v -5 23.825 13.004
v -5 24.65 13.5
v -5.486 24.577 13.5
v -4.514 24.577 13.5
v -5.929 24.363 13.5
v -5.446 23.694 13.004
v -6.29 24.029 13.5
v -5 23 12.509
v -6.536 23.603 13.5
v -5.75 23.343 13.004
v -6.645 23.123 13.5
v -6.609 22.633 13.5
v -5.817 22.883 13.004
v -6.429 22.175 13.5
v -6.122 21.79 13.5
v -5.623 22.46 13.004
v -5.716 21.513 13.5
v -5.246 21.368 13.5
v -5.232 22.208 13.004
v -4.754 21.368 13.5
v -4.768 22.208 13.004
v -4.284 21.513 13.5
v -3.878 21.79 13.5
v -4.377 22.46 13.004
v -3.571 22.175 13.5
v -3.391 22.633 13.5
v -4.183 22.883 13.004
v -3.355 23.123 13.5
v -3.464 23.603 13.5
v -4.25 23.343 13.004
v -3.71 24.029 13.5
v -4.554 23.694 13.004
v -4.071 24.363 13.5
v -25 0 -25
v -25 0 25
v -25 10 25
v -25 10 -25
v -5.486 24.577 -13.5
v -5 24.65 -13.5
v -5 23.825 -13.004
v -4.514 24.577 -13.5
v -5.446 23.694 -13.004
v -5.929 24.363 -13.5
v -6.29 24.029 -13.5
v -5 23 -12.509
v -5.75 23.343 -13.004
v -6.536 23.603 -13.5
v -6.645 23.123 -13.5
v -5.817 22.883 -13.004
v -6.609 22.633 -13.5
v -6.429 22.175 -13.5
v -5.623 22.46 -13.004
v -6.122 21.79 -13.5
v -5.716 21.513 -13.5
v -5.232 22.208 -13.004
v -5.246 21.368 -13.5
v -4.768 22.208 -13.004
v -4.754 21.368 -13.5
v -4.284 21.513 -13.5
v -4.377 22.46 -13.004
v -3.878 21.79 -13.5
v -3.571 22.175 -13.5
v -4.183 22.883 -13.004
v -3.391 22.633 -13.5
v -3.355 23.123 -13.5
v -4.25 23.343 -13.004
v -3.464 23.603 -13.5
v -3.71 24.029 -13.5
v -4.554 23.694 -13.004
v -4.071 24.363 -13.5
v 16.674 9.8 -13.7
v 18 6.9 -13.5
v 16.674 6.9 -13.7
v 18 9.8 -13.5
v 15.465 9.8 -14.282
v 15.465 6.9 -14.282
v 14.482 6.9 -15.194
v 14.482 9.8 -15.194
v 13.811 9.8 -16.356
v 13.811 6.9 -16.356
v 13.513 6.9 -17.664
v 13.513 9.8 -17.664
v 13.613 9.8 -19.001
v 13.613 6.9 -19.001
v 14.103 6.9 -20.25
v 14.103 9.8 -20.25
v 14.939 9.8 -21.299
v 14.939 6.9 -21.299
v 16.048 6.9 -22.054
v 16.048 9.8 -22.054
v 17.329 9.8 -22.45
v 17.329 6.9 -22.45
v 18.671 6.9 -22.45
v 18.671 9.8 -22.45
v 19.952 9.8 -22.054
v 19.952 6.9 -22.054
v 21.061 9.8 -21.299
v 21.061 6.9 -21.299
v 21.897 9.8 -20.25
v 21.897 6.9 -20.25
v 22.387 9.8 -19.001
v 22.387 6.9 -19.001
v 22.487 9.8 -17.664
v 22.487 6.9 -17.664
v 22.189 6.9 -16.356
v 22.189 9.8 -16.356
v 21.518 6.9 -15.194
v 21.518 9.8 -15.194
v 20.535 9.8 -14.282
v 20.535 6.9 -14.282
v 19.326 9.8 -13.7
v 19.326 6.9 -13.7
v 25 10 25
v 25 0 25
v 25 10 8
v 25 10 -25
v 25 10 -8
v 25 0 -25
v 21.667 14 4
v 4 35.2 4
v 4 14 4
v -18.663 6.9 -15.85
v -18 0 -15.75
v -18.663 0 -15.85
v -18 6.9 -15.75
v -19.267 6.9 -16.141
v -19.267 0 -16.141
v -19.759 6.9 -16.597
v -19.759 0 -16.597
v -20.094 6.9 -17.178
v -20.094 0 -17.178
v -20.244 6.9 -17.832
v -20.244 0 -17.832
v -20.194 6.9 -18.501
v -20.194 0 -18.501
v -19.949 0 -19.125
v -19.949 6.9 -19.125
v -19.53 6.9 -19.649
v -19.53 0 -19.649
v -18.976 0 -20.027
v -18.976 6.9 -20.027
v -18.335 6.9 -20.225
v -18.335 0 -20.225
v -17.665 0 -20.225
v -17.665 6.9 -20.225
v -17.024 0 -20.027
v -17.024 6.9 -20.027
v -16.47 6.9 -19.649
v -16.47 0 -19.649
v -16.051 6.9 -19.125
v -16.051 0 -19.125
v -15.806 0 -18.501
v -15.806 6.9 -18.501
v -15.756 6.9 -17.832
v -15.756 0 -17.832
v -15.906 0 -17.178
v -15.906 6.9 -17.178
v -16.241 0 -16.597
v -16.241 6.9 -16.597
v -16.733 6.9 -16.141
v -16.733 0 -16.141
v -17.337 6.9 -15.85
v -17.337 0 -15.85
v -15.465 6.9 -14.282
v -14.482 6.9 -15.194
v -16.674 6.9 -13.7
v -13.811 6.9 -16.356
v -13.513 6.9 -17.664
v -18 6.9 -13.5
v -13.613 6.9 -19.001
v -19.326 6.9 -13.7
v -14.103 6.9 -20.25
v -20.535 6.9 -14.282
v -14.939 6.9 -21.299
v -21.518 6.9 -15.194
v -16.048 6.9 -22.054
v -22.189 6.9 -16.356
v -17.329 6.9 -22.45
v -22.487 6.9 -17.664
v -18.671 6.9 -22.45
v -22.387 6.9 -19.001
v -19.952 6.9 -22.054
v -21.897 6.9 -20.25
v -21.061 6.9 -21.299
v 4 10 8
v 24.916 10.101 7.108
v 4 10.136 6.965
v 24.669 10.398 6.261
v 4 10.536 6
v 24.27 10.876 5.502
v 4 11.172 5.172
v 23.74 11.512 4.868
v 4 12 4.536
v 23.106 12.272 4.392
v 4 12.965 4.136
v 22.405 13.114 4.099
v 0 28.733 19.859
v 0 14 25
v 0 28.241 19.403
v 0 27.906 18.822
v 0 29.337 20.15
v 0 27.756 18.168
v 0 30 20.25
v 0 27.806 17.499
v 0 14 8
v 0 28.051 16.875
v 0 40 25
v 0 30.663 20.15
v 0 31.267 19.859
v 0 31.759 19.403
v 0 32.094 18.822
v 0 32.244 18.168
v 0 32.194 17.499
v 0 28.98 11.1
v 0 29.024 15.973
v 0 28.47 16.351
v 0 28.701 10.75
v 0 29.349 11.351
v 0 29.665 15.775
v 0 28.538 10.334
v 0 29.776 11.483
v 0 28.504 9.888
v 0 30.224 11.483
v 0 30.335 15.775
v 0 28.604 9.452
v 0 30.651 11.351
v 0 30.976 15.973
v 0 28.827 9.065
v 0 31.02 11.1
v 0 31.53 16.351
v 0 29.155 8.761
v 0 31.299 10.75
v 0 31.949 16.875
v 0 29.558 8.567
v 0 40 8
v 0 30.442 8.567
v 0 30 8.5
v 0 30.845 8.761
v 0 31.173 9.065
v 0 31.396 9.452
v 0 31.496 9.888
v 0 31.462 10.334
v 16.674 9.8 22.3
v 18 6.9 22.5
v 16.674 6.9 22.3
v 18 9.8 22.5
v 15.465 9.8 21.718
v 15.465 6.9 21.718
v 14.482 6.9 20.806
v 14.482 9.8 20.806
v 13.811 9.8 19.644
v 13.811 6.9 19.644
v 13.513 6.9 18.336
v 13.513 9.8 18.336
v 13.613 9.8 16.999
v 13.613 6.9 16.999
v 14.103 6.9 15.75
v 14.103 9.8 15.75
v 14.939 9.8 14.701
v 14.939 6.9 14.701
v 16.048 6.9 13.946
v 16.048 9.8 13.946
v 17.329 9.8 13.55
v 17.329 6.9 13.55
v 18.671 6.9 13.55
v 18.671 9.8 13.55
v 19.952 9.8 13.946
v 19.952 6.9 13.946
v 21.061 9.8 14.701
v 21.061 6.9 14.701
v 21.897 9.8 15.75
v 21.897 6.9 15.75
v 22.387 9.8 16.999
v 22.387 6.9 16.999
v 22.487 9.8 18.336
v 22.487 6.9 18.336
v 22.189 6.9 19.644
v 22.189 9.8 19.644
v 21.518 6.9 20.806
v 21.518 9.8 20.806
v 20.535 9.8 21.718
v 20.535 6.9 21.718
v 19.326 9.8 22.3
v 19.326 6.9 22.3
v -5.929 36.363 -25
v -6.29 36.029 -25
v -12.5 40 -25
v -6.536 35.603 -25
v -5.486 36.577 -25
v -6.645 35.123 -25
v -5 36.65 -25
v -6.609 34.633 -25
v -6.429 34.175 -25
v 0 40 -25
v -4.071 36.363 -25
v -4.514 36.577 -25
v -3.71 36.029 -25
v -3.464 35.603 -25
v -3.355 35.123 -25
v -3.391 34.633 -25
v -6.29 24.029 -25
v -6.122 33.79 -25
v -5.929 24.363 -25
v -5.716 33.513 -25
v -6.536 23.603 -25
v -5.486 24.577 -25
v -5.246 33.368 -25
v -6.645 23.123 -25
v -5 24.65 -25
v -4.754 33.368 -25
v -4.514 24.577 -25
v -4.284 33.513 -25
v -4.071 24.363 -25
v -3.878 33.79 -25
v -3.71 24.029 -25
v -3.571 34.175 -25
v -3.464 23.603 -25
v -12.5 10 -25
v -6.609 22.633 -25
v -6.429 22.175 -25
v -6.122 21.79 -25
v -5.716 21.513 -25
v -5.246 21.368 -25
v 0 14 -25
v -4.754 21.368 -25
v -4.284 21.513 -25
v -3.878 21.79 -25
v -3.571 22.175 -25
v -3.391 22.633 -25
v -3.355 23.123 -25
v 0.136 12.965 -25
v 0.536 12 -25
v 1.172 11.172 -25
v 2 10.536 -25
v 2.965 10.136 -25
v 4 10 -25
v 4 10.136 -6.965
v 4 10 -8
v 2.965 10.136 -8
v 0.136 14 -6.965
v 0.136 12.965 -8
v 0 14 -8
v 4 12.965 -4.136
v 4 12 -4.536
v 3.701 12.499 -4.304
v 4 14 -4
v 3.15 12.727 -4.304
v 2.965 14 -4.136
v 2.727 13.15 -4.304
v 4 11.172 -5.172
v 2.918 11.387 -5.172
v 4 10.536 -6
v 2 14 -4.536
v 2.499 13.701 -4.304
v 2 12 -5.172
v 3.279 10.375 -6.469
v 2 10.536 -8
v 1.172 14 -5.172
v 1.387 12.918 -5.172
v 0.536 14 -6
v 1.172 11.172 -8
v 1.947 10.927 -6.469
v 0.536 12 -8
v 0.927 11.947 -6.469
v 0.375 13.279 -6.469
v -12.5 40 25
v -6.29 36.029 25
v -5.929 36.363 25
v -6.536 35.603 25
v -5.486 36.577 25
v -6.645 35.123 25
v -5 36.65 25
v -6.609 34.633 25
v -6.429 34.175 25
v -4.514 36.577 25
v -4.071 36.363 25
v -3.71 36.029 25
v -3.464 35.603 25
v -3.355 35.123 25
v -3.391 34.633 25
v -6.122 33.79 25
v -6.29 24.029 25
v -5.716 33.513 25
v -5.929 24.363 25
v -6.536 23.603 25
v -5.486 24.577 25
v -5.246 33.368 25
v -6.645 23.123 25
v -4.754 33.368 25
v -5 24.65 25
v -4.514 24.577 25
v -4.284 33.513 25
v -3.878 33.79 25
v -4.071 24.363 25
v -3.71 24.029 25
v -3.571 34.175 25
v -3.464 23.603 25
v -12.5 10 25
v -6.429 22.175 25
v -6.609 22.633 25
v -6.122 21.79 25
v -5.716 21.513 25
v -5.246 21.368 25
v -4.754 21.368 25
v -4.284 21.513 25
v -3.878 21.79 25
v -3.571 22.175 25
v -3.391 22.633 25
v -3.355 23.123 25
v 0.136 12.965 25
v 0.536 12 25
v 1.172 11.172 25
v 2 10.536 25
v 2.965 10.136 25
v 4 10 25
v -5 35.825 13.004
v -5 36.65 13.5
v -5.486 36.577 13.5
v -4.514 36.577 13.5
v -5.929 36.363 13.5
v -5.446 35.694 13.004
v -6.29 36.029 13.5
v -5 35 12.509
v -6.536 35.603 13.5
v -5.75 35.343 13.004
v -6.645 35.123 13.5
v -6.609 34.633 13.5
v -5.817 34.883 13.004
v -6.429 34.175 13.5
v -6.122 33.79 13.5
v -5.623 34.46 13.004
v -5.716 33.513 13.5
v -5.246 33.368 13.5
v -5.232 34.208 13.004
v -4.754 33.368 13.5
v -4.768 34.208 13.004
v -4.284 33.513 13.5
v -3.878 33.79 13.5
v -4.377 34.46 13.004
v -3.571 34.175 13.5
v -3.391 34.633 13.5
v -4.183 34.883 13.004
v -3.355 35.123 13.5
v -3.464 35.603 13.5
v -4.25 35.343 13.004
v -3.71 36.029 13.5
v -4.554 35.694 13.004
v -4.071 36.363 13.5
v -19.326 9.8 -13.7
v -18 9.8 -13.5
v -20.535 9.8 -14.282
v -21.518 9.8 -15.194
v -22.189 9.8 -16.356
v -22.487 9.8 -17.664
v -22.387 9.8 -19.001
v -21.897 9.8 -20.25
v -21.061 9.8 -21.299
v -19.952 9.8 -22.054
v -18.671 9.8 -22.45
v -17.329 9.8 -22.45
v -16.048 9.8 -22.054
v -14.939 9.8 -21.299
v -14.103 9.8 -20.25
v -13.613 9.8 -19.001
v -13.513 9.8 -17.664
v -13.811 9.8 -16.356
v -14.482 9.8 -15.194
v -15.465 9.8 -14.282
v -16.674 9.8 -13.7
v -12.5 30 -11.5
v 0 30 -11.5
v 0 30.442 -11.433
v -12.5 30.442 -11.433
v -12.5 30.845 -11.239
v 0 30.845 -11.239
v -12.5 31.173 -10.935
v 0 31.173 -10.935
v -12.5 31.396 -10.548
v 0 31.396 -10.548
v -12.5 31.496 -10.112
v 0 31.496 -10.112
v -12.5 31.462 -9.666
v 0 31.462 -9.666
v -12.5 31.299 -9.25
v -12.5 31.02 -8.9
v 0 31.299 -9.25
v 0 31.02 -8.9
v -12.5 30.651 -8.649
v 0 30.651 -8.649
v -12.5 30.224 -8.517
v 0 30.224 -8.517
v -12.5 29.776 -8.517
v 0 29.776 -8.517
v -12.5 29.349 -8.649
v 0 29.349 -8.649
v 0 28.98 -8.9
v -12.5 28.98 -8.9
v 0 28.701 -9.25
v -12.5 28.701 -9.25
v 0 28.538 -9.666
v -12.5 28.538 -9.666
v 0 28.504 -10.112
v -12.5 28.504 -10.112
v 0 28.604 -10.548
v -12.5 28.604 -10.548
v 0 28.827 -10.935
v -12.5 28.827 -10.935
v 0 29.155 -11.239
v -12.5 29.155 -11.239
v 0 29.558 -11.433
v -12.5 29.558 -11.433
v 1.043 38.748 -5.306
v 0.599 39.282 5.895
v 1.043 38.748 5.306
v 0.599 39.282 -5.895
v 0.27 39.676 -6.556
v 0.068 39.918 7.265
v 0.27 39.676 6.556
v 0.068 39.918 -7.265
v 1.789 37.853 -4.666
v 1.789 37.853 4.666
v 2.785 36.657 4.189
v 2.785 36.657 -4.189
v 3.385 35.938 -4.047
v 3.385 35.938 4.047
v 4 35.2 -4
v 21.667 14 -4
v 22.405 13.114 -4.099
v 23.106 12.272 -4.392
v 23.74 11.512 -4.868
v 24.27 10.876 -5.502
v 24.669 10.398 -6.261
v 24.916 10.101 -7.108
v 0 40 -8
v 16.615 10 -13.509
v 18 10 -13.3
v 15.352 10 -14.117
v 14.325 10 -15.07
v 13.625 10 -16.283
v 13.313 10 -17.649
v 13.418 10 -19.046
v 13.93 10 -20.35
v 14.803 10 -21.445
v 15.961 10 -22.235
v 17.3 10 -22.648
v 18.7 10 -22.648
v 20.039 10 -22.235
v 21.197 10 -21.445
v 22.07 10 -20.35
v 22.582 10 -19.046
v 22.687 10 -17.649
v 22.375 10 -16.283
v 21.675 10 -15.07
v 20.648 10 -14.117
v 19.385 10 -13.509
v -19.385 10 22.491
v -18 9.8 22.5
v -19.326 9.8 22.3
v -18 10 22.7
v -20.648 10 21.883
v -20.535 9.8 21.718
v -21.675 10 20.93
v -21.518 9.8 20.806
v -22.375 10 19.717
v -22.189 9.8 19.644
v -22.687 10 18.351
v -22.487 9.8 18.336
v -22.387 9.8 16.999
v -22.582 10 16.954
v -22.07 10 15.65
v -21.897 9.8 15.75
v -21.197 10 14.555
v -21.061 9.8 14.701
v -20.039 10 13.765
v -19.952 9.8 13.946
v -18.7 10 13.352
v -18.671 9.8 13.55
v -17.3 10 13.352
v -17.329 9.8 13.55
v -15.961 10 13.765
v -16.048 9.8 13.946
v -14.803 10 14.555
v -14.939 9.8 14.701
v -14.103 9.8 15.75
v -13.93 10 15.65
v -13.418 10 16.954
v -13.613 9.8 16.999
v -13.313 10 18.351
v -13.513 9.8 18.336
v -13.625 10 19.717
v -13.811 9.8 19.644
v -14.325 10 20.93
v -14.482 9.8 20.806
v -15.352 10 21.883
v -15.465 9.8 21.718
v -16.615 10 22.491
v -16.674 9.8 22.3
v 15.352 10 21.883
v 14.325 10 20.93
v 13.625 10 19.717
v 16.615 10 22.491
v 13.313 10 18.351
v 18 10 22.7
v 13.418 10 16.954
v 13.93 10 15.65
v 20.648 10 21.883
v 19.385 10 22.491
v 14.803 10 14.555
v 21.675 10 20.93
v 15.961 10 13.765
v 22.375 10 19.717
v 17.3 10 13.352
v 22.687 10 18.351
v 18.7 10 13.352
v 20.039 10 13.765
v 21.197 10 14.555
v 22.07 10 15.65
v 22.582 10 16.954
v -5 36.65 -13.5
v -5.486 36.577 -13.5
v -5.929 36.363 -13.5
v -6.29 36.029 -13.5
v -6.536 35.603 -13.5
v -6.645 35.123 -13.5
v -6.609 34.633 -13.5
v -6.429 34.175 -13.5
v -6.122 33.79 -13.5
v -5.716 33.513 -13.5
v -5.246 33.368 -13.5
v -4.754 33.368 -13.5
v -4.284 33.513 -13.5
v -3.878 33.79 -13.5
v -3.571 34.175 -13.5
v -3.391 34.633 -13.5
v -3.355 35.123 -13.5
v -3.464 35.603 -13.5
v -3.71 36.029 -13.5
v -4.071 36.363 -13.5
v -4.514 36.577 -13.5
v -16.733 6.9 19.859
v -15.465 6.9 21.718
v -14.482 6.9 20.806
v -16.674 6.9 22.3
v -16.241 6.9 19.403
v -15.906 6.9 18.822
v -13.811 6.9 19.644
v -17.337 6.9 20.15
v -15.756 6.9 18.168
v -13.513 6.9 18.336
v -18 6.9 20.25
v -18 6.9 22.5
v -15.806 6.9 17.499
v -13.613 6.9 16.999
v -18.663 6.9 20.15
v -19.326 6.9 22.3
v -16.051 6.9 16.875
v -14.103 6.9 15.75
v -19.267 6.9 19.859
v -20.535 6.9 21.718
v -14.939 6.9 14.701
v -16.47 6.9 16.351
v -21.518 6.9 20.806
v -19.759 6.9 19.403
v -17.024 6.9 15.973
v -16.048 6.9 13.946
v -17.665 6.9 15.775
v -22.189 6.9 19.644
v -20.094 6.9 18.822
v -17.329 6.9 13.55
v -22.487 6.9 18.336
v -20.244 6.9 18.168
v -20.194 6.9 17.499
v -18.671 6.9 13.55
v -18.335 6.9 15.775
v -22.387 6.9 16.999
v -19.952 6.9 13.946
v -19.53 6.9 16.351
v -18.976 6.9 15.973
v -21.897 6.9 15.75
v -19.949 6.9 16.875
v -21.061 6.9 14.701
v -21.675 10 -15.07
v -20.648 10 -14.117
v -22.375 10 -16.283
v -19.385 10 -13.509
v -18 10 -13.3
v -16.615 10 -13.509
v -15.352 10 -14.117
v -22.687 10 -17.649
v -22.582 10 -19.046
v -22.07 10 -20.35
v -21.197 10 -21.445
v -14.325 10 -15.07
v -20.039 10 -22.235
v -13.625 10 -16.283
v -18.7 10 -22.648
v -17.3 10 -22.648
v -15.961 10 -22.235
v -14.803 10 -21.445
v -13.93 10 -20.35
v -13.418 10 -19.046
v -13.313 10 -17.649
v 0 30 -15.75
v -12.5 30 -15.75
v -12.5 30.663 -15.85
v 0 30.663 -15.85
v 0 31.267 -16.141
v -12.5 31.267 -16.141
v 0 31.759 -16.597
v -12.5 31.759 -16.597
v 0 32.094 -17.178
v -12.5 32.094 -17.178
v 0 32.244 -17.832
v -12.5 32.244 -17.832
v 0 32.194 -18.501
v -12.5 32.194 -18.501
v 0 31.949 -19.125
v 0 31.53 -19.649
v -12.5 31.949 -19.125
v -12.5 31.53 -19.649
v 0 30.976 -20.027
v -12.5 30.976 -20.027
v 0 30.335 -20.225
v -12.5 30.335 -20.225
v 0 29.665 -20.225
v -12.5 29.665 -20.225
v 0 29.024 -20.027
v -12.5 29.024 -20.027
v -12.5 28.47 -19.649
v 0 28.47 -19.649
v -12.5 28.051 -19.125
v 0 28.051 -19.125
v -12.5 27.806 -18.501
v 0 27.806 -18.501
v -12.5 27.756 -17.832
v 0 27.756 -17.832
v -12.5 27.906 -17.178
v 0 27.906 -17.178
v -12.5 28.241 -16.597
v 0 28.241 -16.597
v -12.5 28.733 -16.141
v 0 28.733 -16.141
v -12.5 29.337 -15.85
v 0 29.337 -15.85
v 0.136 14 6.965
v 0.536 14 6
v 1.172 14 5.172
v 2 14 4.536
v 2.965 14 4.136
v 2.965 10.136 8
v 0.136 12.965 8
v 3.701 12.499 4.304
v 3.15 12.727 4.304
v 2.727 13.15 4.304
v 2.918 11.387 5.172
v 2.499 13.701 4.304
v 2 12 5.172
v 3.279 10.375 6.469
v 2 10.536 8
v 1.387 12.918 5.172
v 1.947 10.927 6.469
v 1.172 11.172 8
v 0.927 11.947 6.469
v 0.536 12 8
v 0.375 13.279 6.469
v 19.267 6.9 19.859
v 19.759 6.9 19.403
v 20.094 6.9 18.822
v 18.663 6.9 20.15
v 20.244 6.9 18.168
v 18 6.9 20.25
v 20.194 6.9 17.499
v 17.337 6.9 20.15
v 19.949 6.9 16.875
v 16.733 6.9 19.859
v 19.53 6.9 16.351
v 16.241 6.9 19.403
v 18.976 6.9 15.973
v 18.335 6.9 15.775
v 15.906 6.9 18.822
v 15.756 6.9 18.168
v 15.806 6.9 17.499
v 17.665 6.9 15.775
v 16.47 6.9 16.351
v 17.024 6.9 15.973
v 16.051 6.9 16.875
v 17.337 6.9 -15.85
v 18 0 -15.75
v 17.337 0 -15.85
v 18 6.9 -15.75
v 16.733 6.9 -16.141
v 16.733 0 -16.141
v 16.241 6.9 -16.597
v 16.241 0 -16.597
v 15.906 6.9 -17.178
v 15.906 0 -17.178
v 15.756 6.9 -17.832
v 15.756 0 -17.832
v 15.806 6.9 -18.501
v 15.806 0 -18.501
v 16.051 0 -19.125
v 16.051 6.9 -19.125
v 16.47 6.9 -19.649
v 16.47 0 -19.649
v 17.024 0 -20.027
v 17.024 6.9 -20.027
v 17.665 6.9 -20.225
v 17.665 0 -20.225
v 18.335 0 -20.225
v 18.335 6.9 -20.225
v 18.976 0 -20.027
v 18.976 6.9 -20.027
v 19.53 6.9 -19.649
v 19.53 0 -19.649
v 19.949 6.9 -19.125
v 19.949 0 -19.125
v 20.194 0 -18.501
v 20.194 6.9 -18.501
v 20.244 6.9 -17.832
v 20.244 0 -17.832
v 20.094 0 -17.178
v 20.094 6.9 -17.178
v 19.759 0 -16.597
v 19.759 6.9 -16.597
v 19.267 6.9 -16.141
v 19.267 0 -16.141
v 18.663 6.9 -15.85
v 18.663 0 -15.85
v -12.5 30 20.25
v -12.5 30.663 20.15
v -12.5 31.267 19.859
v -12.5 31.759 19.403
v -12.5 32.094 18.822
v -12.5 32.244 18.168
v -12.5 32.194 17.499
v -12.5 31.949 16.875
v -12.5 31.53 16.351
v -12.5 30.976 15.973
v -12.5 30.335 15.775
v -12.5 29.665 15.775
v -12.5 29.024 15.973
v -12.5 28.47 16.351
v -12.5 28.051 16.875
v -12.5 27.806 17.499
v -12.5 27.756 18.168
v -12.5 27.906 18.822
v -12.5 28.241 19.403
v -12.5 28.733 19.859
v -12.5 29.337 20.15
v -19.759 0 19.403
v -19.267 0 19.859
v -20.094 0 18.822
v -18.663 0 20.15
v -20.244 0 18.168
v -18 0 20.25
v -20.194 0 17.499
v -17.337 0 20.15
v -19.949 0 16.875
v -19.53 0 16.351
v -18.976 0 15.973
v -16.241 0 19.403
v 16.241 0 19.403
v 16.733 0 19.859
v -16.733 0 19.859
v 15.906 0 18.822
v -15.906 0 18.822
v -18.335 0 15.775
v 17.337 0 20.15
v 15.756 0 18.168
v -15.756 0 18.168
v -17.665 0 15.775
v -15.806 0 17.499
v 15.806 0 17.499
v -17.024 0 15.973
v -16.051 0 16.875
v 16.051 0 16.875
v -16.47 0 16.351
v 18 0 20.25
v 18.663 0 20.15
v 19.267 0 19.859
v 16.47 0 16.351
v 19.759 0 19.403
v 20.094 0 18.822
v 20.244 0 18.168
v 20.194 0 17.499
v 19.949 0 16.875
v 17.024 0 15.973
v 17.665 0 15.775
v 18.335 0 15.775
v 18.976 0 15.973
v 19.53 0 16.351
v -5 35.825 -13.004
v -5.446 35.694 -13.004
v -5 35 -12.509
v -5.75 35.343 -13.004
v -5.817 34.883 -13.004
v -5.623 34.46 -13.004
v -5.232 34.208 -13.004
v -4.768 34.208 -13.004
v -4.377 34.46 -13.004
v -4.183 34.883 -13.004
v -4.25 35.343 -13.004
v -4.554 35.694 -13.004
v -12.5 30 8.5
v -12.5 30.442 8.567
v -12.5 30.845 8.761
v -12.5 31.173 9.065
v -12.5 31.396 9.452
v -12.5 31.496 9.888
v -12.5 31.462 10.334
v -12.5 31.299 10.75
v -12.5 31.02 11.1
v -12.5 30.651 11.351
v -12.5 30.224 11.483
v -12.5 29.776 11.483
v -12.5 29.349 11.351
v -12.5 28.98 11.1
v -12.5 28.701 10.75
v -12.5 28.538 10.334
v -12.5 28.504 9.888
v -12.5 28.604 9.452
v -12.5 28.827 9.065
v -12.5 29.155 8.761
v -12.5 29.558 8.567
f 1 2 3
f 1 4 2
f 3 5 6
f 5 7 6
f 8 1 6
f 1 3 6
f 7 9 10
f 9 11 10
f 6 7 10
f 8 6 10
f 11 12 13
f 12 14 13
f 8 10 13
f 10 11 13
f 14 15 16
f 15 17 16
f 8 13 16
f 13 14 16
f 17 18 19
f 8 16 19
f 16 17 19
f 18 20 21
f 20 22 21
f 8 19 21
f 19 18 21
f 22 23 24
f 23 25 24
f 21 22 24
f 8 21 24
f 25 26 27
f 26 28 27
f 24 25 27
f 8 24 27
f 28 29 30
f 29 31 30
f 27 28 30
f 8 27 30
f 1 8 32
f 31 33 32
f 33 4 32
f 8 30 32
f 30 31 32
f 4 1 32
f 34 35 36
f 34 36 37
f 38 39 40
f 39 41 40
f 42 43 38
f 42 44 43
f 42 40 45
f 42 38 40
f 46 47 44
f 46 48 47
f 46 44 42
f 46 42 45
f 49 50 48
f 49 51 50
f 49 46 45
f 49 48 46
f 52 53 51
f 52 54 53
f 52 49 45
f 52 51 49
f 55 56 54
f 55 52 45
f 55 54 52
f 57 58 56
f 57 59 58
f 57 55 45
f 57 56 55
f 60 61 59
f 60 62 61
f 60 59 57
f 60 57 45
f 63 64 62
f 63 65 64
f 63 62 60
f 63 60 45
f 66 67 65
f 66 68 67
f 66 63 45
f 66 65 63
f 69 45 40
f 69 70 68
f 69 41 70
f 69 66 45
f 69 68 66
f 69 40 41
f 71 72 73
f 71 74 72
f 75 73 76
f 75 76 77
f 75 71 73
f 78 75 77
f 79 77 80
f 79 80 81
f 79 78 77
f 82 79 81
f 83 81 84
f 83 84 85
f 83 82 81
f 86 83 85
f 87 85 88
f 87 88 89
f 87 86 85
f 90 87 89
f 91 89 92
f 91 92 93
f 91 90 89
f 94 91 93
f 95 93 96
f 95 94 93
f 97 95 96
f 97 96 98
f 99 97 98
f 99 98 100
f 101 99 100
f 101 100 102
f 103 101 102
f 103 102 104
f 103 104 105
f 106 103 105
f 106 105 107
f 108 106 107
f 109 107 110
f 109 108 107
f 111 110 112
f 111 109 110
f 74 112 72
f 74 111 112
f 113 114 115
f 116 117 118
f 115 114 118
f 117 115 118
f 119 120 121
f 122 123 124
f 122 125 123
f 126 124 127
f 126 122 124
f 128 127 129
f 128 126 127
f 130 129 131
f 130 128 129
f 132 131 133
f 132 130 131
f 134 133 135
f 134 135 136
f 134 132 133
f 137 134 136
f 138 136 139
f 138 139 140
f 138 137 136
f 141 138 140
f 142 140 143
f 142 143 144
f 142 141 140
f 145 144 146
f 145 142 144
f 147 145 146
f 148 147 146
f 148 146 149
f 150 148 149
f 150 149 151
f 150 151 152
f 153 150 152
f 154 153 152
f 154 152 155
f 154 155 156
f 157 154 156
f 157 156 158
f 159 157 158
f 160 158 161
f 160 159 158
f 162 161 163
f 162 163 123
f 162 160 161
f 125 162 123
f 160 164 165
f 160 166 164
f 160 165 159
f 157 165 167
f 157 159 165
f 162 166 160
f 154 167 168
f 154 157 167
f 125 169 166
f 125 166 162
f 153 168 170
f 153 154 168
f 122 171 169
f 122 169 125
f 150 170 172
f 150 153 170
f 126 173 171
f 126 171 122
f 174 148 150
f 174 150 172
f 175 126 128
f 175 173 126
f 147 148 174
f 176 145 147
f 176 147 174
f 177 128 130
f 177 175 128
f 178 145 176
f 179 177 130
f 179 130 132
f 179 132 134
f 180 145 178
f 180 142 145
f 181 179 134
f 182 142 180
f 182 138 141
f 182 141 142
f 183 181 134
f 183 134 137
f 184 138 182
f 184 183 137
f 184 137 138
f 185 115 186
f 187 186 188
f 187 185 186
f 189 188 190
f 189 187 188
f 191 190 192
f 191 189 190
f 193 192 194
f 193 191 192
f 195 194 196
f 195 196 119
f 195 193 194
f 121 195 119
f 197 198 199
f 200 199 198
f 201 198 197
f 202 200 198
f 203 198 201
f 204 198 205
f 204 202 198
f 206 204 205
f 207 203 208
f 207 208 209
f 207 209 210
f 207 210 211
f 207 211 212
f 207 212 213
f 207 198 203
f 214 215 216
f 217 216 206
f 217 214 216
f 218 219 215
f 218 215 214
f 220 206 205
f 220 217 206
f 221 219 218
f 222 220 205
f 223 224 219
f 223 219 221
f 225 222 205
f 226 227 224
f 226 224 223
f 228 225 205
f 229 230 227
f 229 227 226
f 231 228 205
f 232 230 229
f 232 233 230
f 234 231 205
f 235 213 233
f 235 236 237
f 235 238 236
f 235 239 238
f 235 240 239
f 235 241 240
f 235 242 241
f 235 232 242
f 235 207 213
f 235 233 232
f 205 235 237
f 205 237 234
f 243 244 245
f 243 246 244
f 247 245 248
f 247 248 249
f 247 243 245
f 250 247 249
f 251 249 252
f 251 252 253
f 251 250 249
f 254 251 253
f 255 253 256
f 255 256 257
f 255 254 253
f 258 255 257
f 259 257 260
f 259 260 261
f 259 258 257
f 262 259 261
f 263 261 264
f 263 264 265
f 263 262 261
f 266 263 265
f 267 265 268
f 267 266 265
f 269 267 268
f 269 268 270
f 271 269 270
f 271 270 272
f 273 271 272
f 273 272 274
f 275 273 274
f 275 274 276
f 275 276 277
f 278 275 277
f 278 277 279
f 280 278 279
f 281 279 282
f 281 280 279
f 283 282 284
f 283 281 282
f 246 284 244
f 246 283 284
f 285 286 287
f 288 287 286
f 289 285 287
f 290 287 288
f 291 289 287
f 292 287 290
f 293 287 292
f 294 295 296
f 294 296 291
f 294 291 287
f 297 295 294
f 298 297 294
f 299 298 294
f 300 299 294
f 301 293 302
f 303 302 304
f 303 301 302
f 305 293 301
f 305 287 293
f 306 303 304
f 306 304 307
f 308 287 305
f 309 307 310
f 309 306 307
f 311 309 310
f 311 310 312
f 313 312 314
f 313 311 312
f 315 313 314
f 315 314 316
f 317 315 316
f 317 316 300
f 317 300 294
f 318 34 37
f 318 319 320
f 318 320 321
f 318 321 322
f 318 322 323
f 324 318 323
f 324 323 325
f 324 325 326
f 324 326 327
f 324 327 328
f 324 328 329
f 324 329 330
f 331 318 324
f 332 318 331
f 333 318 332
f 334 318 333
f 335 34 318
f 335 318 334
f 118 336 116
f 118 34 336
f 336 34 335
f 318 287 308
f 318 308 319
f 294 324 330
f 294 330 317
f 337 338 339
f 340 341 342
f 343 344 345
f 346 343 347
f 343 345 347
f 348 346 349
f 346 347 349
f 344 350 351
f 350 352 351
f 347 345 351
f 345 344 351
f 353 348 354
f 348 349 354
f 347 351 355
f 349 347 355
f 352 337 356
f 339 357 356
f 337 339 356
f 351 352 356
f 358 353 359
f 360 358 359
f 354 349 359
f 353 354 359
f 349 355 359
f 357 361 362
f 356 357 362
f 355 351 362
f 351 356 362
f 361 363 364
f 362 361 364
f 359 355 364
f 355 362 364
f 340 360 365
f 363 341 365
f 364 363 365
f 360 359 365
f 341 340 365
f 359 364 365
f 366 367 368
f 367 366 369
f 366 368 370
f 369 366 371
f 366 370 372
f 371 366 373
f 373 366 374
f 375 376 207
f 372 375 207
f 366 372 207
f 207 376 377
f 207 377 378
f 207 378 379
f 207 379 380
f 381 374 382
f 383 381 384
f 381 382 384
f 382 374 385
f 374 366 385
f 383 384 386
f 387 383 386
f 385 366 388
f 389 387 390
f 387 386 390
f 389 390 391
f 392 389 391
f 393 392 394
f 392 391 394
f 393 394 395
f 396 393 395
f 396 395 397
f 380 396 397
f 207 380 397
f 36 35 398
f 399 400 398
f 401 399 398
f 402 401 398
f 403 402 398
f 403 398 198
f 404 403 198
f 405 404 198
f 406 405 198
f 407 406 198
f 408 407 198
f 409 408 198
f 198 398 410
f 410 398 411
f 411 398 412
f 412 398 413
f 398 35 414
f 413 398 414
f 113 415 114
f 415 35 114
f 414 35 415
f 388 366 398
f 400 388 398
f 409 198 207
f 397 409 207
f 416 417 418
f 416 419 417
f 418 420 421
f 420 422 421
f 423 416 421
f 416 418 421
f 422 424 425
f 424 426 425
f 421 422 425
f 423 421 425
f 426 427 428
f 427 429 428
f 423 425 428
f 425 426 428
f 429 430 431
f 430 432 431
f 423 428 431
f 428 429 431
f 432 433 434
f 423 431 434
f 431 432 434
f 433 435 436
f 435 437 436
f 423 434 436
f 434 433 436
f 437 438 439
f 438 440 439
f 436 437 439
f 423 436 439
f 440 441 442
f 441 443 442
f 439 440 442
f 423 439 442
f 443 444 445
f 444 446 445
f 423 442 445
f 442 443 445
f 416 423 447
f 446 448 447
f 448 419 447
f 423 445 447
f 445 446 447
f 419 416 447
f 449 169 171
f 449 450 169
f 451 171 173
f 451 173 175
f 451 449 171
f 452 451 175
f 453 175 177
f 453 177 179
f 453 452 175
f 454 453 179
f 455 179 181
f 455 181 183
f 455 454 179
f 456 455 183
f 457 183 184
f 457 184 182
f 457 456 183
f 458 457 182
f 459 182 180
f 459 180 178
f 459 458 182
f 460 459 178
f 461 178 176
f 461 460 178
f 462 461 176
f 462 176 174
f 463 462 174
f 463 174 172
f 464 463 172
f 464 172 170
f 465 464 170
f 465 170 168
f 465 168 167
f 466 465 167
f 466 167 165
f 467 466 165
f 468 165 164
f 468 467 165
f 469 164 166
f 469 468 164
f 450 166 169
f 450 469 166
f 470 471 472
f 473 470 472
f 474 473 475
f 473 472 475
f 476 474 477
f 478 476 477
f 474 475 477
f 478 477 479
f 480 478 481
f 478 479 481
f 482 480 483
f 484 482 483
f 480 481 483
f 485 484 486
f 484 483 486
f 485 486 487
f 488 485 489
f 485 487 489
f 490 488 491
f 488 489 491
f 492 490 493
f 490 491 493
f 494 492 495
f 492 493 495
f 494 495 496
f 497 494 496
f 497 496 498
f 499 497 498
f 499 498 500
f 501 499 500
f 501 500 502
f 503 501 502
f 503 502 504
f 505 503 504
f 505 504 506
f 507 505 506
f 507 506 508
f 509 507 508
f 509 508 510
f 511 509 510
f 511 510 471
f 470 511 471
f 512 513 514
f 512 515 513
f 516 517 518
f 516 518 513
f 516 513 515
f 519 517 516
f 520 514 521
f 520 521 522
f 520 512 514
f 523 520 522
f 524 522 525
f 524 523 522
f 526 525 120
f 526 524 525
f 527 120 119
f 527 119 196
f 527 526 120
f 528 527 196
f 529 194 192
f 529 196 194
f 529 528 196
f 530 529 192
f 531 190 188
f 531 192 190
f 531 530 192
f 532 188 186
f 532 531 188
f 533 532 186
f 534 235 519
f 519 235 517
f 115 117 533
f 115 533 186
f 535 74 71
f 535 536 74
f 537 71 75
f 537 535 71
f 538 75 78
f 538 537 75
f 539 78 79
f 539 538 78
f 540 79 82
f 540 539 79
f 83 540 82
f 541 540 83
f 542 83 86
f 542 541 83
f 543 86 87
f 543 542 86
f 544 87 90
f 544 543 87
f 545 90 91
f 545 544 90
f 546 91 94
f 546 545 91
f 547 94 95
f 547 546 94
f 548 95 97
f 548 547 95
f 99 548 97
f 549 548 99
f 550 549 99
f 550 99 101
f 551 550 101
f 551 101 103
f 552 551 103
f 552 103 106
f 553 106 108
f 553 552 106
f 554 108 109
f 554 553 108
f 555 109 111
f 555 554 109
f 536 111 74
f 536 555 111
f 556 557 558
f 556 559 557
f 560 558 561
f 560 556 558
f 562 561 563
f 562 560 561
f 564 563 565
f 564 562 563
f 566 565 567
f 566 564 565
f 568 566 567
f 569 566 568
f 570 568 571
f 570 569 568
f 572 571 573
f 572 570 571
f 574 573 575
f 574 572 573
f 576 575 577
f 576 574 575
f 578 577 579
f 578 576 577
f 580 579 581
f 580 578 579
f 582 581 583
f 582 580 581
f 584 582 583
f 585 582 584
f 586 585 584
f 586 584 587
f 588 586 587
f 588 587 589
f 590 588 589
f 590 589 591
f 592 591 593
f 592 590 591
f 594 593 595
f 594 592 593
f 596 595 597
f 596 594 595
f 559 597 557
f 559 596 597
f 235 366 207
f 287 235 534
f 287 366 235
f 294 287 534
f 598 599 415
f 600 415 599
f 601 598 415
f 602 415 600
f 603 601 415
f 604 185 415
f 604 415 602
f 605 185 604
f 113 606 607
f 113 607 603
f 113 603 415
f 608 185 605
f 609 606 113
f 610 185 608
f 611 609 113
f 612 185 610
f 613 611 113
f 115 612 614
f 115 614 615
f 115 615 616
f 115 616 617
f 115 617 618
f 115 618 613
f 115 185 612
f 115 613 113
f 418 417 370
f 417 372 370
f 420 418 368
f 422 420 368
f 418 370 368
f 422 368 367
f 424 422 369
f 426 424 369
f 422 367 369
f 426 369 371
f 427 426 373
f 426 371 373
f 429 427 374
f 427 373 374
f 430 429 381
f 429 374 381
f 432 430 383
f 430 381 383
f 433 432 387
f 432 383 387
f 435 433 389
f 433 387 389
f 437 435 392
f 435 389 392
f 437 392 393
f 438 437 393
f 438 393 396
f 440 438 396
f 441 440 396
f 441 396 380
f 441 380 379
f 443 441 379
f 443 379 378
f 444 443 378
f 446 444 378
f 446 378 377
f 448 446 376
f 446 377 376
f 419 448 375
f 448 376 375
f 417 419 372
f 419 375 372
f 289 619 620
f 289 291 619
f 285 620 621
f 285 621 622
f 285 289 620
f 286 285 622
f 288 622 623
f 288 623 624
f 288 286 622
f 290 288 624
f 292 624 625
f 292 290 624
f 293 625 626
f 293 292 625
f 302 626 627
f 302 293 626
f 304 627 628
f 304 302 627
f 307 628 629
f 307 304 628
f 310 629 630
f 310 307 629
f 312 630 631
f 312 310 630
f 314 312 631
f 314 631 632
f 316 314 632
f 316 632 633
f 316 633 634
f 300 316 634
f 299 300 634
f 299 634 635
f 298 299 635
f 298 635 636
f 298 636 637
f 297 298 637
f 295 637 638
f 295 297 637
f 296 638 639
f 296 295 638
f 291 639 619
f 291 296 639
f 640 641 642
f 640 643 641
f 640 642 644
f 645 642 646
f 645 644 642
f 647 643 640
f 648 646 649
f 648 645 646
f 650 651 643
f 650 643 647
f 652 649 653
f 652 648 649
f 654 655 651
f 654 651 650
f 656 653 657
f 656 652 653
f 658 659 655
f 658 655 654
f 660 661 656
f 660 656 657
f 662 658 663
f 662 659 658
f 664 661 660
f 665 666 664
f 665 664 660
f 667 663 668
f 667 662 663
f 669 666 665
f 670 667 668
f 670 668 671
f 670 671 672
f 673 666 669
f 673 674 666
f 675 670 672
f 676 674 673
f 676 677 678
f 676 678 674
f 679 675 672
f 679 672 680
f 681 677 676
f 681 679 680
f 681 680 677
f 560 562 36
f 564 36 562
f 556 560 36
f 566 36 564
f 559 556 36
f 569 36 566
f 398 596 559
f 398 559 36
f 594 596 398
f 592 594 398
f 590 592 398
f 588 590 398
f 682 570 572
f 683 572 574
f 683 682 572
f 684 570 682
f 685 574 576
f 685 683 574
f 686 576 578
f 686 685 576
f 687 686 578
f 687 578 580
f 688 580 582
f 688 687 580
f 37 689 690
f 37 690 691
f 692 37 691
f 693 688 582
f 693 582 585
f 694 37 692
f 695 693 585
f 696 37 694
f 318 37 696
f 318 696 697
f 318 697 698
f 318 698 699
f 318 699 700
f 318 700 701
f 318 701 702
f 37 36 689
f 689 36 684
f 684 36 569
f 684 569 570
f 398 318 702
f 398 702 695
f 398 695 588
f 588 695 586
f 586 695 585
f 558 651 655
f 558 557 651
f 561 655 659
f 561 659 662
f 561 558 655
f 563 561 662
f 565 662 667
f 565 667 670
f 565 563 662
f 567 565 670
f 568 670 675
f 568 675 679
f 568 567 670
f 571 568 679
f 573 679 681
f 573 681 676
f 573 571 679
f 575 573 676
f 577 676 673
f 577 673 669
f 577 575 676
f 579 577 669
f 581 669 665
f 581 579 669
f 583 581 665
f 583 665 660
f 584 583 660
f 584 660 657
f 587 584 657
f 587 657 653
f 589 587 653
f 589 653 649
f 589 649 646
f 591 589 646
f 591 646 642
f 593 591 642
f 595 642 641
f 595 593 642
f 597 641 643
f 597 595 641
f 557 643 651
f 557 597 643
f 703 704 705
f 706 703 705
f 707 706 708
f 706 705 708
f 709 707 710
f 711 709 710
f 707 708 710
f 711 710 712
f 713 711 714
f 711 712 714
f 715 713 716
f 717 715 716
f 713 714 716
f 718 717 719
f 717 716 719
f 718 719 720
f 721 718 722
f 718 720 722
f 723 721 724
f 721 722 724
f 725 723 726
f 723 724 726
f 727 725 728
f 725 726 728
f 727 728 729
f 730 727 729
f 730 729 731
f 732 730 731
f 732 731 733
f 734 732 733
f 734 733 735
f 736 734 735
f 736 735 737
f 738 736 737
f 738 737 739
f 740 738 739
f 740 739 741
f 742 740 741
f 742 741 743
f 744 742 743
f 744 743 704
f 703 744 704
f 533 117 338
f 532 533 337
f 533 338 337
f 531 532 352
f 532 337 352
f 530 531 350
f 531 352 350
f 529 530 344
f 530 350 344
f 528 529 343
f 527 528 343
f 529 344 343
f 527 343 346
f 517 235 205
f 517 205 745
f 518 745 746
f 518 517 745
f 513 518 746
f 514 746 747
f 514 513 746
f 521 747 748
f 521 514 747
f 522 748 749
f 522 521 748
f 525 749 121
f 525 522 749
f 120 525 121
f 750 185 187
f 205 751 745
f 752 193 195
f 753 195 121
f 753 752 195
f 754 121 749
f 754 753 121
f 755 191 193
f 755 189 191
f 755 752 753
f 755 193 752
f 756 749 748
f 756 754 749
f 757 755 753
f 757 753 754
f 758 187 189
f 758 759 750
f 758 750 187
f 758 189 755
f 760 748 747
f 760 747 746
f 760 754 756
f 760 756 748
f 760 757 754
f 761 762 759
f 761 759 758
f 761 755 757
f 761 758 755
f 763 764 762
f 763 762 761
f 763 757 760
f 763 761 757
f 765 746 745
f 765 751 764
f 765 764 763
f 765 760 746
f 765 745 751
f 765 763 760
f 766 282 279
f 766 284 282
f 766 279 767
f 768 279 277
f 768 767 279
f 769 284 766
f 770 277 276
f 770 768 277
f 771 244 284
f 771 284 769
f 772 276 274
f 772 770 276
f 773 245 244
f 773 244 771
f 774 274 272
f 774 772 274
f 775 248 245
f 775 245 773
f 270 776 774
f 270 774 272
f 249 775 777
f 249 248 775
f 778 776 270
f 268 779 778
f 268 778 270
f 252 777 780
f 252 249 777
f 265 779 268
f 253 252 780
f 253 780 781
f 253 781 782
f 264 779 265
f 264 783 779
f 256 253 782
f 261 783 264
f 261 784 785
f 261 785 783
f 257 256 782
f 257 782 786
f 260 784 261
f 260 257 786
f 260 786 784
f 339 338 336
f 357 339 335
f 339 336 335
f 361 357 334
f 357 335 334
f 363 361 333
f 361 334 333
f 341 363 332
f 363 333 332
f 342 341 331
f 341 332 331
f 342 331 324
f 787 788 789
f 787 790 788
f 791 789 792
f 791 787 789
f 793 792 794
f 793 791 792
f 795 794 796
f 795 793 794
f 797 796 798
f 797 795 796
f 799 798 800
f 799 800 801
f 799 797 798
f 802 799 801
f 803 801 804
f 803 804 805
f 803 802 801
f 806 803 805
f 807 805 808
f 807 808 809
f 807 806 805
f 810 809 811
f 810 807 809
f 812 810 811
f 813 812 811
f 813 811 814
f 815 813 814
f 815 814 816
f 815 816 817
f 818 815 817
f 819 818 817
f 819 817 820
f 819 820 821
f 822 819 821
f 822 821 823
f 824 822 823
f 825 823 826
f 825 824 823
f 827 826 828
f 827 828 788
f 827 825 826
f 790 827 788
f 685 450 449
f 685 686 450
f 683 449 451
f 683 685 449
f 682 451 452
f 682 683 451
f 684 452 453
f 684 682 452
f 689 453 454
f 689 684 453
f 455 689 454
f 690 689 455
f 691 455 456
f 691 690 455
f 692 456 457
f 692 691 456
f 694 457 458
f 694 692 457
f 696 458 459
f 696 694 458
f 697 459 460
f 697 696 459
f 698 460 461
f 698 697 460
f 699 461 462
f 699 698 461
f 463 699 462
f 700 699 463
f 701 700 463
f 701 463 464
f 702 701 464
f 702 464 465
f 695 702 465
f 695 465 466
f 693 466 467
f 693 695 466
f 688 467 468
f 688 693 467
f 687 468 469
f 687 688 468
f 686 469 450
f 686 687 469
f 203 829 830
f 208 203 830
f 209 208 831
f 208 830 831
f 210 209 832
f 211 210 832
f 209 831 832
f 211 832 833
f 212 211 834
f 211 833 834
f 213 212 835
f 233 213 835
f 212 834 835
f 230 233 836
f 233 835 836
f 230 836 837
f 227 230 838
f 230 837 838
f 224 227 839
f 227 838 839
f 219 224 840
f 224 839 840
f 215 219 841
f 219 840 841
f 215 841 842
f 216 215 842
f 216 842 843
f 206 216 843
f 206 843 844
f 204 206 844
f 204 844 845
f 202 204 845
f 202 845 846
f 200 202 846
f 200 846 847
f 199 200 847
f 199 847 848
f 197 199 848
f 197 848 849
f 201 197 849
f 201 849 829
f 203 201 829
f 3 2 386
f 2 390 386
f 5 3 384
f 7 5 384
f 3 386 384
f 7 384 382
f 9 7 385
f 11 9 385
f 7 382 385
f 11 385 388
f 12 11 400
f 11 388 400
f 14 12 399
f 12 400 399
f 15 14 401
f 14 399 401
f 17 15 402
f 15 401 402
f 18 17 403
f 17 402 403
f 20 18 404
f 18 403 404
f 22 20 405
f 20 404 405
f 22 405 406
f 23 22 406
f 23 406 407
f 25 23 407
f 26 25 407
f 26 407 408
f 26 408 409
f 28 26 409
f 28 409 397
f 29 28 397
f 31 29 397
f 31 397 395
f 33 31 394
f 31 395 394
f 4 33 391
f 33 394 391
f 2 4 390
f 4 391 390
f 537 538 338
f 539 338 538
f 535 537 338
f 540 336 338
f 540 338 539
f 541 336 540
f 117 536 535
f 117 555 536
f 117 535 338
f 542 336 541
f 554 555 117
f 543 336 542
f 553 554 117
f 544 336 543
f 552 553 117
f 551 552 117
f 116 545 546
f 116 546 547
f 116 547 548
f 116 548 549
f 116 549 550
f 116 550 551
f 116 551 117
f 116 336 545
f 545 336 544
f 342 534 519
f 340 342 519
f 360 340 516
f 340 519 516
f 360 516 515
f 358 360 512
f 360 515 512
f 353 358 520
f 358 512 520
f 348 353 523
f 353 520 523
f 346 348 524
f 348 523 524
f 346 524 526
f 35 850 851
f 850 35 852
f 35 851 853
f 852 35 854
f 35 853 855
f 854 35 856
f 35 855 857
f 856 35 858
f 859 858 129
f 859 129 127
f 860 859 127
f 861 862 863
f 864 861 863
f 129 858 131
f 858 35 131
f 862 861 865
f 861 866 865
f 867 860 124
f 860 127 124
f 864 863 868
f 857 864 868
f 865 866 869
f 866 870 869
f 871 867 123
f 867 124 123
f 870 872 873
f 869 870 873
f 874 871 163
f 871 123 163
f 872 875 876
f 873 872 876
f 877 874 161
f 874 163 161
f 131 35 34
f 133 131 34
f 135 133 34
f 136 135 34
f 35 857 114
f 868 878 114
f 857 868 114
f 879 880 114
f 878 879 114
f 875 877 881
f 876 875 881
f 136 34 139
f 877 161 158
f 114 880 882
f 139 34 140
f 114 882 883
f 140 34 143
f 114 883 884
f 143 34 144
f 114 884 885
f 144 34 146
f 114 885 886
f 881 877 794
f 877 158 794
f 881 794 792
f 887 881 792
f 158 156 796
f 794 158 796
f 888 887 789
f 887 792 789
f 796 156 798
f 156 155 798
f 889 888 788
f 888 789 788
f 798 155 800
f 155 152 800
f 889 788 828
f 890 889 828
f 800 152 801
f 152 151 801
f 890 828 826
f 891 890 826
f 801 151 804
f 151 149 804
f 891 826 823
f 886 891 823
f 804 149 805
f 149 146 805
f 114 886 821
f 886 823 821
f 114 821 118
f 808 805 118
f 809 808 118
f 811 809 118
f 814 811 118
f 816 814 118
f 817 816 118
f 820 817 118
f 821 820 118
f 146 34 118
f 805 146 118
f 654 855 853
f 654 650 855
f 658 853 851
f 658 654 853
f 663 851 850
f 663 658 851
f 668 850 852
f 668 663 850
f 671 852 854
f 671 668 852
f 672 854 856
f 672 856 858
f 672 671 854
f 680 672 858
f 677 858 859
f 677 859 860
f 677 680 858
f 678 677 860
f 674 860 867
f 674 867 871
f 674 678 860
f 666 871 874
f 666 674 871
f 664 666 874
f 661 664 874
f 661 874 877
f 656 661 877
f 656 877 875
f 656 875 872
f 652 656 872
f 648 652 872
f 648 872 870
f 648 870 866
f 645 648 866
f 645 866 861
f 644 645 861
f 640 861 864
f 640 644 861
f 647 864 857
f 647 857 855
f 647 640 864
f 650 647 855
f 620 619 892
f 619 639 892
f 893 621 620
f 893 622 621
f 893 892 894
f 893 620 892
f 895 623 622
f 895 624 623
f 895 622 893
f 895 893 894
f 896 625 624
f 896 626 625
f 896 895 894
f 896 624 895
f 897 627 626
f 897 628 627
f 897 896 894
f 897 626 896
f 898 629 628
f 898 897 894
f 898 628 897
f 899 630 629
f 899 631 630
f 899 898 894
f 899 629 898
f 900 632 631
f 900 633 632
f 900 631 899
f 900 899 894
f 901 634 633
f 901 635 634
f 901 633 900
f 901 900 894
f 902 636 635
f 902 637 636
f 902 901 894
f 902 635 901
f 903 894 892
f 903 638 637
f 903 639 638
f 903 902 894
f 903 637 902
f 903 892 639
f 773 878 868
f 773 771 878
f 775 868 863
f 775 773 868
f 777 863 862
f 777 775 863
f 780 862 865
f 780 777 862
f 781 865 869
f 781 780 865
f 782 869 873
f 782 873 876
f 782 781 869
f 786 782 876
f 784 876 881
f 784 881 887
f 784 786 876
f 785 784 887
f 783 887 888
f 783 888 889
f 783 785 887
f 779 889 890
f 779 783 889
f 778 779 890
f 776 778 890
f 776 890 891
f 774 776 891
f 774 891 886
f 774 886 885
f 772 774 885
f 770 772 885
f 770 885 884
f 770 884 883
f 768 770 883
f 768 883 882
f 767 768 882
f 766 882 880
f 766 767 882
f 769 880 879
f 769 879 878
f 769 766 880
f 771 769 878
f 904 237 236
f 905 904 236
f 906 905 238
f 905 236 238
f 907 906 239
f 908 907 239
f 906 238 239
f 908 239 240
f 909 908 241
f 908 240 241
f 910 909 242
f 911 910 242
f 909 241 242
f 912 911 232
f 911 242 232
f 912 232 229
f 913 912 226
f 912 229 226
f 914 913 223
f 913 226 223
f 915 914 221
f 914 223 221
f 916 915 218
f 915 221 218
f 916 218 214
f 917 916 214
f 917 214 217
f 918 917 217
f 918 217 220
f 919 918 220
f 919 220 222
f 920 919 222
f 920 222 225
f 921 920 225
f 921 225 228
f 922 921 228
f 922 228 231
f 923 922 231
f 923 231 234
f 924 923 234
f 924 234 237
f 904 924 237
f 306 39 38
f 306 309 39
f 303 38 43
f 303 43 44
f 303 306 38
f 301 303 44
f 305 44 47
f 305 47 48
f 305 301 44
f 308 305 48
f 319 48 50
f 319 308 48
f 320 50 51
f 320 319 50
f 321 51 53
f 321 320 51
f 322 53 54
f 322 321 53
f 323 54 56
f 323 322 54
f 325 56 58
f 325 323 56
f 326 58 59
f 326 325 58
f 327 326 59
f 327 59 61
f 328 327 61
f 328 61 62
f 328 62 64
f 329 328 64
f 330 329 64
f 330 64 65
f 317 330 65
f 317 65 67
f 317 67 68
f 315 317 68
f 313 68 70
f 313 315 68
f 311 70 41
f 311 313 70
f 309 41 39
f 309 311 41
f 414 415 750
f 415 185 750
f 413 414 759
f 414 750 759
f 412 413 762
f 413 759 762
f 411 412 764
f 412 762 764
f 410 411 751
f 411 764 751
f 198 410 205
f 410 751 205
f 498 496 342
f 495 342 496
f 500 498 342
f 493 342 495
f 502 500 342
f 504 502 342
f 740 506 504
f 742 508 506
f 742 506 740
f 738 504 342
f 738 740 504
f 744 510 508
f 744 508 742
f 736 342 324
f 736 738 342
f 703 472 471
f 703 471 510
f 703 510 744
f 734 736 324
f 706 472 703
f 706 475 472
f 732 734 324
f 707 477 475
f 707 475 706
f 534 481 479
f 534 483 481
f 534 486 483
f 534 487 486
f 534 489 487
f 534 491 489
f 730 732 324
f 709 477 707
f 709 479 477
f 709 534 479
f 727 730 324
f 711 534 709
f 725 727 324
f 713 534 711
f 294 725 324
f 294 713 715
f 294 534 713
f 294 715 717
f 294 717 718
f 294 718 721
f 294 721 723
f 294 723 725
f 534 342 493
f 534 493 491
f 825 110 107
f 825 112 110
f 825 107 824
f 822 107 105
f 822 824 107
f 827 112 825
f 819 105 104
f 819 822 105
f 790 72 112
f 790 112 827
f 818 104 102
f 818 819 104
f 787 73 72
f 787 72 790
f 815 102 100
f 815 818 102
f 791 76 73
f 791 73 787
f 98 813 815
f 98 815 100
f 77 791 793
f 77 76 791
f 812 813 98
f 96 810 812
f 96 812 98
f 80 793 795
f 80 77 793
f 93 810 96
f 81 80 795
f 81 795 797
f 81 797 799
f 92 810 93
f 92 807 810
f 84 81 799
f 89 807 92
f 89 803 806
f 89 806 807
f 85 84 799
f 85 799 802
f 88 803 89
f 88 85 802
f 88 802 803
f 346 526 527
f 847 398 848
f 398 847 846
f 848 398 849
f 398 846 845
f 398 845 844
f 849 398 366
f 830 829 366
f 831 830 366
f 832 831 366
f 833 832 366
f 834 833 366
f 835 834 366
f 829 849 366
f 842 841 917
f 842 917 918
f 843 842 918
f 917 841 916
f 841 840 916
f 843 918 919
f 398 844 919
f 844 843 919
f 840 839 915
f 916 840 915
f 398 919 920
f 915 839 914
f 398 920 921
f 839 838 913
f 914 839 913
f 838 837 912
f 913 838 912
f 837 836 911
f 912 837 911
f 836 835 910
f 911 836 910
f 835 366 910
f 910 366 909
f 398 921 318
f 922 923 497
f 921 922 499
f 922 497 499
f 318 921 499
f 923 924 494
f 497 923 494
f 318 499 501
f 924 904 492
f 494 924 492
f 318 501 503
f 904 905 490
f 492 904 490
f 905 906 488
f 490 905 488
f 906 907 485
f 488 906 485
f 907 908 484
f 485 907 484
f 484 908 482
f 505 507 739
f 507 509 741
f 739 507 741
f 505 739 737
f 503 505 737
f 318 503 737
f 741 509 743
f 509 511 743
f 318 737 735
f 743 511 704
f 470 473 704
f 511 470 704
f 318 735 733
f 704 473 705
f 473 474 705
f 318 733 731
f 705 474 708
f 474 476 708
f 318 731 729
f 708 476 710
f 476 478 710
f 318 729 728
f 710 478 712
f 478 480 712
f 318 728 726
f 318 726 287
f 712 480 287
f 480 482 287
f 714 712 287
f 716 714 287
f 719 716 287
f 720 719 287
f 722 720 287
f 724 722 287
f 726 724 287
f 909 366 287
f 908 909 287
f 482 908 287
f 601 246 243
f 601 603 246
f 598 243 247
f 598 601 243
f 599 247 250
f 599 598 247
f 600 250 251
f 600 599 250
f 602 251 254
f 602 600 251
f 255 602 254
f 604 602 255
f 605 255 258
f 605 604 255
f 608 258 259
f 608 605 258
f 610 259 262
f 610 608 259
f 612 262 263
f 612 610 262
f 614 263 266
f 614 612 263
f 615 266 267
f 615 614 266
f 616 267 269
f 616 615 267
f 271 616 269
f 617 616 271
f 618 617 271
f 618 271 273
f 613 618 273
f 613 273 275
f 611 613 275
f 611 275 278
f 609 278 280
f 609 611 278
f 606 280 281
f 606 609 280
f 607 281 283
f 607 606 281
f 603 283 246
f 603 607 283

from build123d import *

# Parameters (mm, degrees)
SKIZZE1_W                                    = 50
SKIZZE1_H                                    = 50
AUFSATZ_LINEAR_AUSTRAGEN1_DEPTH              = 40
SKIZZE2_W                                    = 12.5
SKIZZE2_H                                    = 50
SKIZZE2_W_2                                  = 25
SCHNITT_LINEAR_AUSTRAGEN1_DEPTH              = 30
STIRNSENKUNG_F_R_M4_FLACHKOPFSCHRAUB_2_COUNT = 2
STIRNSENKUNG_F_R_M4_FLACHKOPFSCHRAUB_2_PITCH = 36
STIRNSENKUNG_F_R_M4_FLACHKOPFSCHRAUB_3_COUNT = 2
STIRNSENKUNG_F_R_M4_FLACHKOPFSCHRAUB_3_PITCH = 36
STIRNSENKUNG_F_R_M4_FLACHKOPFSCHRAUB_4_COUNT = 2
STIRNSENKUNG_F_R_M4_FLACHKOPFSCHRAUB_4_PITCH = 50.911688245
VERST_RKUNGSRIPPE4_REACH                     = 55.385
SKIZZE7_WALL_W                               = 147.8220309
SKIZZE7_WALL_H                               = 8
VERRUNDUNG1_R                                = 4
DURCHGANGSLOCH_F_R_M41_D                     = 4.5
F_3_0_3_DURCHMESSER_BOHRUNG1_D               = 3
M4_GEWINDEBOHRUNG1_AT_2_COUNT                = 2
M4_GEWINDEBOHRUNG1_AT_2_PITCH                = 12


with BuildPart() as part:
    # Skizze1 → Aufsatz-Linear austragen1 (new body)
    with BuildSketch(Plane(origin=(0, 0, 0), x_dir=(1, 0, 0), z_dir=(0, 1, 0))):
        Rectangle(SKIZZE1_W, SKIZZE1_H)
    extrude(amount=AUFSATZ_LINEAR_AUSTRAGEN1_DEPTH)

    # Skizze2 → Schnitt-Linear austragen1 (cut)
    with BuildSketch(Plane(origin=(0, 40, 0), x_dir=(1, 0, 0), z_dir=(0, 1, 0))):
        with Locations((-18.75, 0)):
            Rectangle(SKIZZE2_W, SKIZZE2_H)
        with Locations((12.5, 0)):
            Rectangle(SKIZZE2_W_2, SKIZZE2_H)
    extrude(amount=-SCHNITT_LINEAR_AUSTRAGEN1_DEPTH, mode=Mode.SUBTRACT)

    # Skizze4 → Stirnsenkung für M4 Flachkopfschraube mit Schlitz1 (revolve, cut)
    with BuildSketch(Plane(origin=(-18, 10, 18), x_dir=(0, 0, 1), z_dir=(1, 0, 0))):
        Polygon((0, 0), (0, 10), (2.25, 10), (2.25, 3.1), (4.5, 3.1), (4.5, 0.2), (4.7, 0), align=None)
    stirnsenkung_f_r_m4_flachkopfschraube_mi = revolve(axis=Axis((-18, 16.35, 18), (0, -1, 0)), mode=Mode.SUBTRACT)

    # Stirnsenkung f_r M4 Flachkopfschraub 2: Stirnsenkung für M4 Flachkopfschraube mit Schlitz1 ×2
    with Locations(*[(0, 0, -i * STIRNSENKUNG_F_R_M4_FLACHKOPFSCHRAUB_2_PITCH) for i in range(1, STIRNSENKUNG_F_R_M4_FLACHKOPFSCHRAUB_2_COUNT)]):
        add(stirnsenkung_f_r_m4_flachkopfschraube_mi, mode=Mode.SUBTRACT)

    # Stirnsenkung f_r M4 Flachkopfschraub 3: Stirnsenkung für M4 Flachkopfschraube mit Schlitz1 ×2
    with Locations(*[(i * STIRNSENKUNG_F_R_M4_FLACHKOPFSCHRAUB_3_PITCH, 0, 0) for i in range(1, STIRNSENKUNG_F_R_M4_FLACHKOPFSCHRAUB_3_COUNT)]):
        add(stirnsenkung_f_r_m4_flachkopfschraube_mi, mode=Mode.SUBTRACT)

    # Stirnsenkung f_r M4 Flachkopfschraub 4: Stirnsenkung für M4 Flachkopfschraube mit Schlitz1 ×2
    with Locations(*[Vector(0.7071067811865476, 0, -0.7071067811865476) * (i * STIRNSENKUNG_F_R_M4_FLACHKOPFSCHRAUB_4_PITCH) for i in range(1, STIRNSENKUNG_F_R_M4_FLACHKOPFSCHRAUB_4_COUNT)]):
        add(stirnsenkung_f_r_m4_flachkopfschraube_mi, mode=Mode.SUBTRACT)

    # Skizze7 wall → Verstärkungsrippe4 (add, up to next)
    with BuildSketch(Plane(origin=(12.5, 25, 0), x_dir=(0.640184399664, -0.768221279597, 0), z_dir=(0.768221279597, 0.640184399664, 0)), mode=Mode.PRIVATE) as verst_rkungsrippe4_sk1:
        Rectangle(SKIZZE7_WALL_W, SKIZZE7_WALL_H)
    verst_rkungsrippe4_tool1 = extrude(verst_rkungsrippe4_sk1.sketch, amount=-VERST_RKUNGSRIPPE4_REACH, mode=Mode.PRIVATE) - part.part
    add(verst_rkungsrippe4_tool1.solids().sort_by_distance((12.5, 25, 0))[0])

    # Verrundung1
    verrundung1_edges = [part.edges().sort_by_distance(p)[0] for p in [
        (0, 10, -14.5),
        (0, 10, 14.5),
        (12.5, 10, -4),
        (12.5, 10, 4),
        (0, 25, 4),
        (0, 25, -4),
    ]]
    fillet(verrundung1_edges, radius=VERRUNDUNG1_R)

    # Durchgangsloch für M41 (through all)
    with Locations(Plane(origin=(0, 0, 0), x_dir=(0, 0, -1), z_dir=(1, 0, 0))):
        with Locations((-18, 30), (18, 30)):
            Hole(DURCHGANGSLOCH_F_R_M41_D / 2)

    # Ø3.0 (3) Durchmesser Bohrung1 (through all)
    with Locations(Plane.ZY.offset(12.5)):
        with Locations((-10, 30), (10, 30)):
            Hole(F_3_0_3_DURCHMESSER_BOHRUNG1_D / 2)

    # Skizze14 → M4 Gewindebohrung1 (revolve, cut)
    with BuildSketch(Plane(origin=(-5, 35, -25), x_dir=(0, 1, 0), z_dir=(1, 0, 0))):
        Polygon((0, 0), (0, 12.491420021), (1.65, 11.5), (1.65, 0), align=None)
    m4_gewindebohrung1 = revolve(axis=Axis((-5, 35, -31.35), (0, 0, 1)), mode=Mode.SUBTRACT)

    # M4 Gewindebohrung1 at 2: M4 Gewindebohrung1 ×2
    with Locations(*[(0, -i * M4_GEWINDEBOHRUNG1_AT_2_PITCH, 0) for i in range(1, M4_GEWINDEBOHRUNG1_AT_2_COUNT)]):
        add(m4_gewindebohrung1, mode=Mode.SUBTRACT)

    # Spiegeln1: M4 Gewindebohrung1 across plane
    add(m4_gewindebohrung1.mirror(Plane.XY), mode=Mode.SUBTRACT)

    # Spiegeln1 copy 1 sketch → Spiegeln1 copy 1 (revolve, cut)
    with BuildSketch(Plane(origin=(-5, 23, 25), x_dir=(0, 1, 0), z_dir=(1, 0, 0))):
        Polygon((0, 0), (0, -12.491420021), (1.65, -11.5), (1.65, 0), align=None)
    revolve(axis=Axis((-5, 23, 31.35), (0, 0, 1)), mode=Mode.SUBTRACT)


solid = part.part
